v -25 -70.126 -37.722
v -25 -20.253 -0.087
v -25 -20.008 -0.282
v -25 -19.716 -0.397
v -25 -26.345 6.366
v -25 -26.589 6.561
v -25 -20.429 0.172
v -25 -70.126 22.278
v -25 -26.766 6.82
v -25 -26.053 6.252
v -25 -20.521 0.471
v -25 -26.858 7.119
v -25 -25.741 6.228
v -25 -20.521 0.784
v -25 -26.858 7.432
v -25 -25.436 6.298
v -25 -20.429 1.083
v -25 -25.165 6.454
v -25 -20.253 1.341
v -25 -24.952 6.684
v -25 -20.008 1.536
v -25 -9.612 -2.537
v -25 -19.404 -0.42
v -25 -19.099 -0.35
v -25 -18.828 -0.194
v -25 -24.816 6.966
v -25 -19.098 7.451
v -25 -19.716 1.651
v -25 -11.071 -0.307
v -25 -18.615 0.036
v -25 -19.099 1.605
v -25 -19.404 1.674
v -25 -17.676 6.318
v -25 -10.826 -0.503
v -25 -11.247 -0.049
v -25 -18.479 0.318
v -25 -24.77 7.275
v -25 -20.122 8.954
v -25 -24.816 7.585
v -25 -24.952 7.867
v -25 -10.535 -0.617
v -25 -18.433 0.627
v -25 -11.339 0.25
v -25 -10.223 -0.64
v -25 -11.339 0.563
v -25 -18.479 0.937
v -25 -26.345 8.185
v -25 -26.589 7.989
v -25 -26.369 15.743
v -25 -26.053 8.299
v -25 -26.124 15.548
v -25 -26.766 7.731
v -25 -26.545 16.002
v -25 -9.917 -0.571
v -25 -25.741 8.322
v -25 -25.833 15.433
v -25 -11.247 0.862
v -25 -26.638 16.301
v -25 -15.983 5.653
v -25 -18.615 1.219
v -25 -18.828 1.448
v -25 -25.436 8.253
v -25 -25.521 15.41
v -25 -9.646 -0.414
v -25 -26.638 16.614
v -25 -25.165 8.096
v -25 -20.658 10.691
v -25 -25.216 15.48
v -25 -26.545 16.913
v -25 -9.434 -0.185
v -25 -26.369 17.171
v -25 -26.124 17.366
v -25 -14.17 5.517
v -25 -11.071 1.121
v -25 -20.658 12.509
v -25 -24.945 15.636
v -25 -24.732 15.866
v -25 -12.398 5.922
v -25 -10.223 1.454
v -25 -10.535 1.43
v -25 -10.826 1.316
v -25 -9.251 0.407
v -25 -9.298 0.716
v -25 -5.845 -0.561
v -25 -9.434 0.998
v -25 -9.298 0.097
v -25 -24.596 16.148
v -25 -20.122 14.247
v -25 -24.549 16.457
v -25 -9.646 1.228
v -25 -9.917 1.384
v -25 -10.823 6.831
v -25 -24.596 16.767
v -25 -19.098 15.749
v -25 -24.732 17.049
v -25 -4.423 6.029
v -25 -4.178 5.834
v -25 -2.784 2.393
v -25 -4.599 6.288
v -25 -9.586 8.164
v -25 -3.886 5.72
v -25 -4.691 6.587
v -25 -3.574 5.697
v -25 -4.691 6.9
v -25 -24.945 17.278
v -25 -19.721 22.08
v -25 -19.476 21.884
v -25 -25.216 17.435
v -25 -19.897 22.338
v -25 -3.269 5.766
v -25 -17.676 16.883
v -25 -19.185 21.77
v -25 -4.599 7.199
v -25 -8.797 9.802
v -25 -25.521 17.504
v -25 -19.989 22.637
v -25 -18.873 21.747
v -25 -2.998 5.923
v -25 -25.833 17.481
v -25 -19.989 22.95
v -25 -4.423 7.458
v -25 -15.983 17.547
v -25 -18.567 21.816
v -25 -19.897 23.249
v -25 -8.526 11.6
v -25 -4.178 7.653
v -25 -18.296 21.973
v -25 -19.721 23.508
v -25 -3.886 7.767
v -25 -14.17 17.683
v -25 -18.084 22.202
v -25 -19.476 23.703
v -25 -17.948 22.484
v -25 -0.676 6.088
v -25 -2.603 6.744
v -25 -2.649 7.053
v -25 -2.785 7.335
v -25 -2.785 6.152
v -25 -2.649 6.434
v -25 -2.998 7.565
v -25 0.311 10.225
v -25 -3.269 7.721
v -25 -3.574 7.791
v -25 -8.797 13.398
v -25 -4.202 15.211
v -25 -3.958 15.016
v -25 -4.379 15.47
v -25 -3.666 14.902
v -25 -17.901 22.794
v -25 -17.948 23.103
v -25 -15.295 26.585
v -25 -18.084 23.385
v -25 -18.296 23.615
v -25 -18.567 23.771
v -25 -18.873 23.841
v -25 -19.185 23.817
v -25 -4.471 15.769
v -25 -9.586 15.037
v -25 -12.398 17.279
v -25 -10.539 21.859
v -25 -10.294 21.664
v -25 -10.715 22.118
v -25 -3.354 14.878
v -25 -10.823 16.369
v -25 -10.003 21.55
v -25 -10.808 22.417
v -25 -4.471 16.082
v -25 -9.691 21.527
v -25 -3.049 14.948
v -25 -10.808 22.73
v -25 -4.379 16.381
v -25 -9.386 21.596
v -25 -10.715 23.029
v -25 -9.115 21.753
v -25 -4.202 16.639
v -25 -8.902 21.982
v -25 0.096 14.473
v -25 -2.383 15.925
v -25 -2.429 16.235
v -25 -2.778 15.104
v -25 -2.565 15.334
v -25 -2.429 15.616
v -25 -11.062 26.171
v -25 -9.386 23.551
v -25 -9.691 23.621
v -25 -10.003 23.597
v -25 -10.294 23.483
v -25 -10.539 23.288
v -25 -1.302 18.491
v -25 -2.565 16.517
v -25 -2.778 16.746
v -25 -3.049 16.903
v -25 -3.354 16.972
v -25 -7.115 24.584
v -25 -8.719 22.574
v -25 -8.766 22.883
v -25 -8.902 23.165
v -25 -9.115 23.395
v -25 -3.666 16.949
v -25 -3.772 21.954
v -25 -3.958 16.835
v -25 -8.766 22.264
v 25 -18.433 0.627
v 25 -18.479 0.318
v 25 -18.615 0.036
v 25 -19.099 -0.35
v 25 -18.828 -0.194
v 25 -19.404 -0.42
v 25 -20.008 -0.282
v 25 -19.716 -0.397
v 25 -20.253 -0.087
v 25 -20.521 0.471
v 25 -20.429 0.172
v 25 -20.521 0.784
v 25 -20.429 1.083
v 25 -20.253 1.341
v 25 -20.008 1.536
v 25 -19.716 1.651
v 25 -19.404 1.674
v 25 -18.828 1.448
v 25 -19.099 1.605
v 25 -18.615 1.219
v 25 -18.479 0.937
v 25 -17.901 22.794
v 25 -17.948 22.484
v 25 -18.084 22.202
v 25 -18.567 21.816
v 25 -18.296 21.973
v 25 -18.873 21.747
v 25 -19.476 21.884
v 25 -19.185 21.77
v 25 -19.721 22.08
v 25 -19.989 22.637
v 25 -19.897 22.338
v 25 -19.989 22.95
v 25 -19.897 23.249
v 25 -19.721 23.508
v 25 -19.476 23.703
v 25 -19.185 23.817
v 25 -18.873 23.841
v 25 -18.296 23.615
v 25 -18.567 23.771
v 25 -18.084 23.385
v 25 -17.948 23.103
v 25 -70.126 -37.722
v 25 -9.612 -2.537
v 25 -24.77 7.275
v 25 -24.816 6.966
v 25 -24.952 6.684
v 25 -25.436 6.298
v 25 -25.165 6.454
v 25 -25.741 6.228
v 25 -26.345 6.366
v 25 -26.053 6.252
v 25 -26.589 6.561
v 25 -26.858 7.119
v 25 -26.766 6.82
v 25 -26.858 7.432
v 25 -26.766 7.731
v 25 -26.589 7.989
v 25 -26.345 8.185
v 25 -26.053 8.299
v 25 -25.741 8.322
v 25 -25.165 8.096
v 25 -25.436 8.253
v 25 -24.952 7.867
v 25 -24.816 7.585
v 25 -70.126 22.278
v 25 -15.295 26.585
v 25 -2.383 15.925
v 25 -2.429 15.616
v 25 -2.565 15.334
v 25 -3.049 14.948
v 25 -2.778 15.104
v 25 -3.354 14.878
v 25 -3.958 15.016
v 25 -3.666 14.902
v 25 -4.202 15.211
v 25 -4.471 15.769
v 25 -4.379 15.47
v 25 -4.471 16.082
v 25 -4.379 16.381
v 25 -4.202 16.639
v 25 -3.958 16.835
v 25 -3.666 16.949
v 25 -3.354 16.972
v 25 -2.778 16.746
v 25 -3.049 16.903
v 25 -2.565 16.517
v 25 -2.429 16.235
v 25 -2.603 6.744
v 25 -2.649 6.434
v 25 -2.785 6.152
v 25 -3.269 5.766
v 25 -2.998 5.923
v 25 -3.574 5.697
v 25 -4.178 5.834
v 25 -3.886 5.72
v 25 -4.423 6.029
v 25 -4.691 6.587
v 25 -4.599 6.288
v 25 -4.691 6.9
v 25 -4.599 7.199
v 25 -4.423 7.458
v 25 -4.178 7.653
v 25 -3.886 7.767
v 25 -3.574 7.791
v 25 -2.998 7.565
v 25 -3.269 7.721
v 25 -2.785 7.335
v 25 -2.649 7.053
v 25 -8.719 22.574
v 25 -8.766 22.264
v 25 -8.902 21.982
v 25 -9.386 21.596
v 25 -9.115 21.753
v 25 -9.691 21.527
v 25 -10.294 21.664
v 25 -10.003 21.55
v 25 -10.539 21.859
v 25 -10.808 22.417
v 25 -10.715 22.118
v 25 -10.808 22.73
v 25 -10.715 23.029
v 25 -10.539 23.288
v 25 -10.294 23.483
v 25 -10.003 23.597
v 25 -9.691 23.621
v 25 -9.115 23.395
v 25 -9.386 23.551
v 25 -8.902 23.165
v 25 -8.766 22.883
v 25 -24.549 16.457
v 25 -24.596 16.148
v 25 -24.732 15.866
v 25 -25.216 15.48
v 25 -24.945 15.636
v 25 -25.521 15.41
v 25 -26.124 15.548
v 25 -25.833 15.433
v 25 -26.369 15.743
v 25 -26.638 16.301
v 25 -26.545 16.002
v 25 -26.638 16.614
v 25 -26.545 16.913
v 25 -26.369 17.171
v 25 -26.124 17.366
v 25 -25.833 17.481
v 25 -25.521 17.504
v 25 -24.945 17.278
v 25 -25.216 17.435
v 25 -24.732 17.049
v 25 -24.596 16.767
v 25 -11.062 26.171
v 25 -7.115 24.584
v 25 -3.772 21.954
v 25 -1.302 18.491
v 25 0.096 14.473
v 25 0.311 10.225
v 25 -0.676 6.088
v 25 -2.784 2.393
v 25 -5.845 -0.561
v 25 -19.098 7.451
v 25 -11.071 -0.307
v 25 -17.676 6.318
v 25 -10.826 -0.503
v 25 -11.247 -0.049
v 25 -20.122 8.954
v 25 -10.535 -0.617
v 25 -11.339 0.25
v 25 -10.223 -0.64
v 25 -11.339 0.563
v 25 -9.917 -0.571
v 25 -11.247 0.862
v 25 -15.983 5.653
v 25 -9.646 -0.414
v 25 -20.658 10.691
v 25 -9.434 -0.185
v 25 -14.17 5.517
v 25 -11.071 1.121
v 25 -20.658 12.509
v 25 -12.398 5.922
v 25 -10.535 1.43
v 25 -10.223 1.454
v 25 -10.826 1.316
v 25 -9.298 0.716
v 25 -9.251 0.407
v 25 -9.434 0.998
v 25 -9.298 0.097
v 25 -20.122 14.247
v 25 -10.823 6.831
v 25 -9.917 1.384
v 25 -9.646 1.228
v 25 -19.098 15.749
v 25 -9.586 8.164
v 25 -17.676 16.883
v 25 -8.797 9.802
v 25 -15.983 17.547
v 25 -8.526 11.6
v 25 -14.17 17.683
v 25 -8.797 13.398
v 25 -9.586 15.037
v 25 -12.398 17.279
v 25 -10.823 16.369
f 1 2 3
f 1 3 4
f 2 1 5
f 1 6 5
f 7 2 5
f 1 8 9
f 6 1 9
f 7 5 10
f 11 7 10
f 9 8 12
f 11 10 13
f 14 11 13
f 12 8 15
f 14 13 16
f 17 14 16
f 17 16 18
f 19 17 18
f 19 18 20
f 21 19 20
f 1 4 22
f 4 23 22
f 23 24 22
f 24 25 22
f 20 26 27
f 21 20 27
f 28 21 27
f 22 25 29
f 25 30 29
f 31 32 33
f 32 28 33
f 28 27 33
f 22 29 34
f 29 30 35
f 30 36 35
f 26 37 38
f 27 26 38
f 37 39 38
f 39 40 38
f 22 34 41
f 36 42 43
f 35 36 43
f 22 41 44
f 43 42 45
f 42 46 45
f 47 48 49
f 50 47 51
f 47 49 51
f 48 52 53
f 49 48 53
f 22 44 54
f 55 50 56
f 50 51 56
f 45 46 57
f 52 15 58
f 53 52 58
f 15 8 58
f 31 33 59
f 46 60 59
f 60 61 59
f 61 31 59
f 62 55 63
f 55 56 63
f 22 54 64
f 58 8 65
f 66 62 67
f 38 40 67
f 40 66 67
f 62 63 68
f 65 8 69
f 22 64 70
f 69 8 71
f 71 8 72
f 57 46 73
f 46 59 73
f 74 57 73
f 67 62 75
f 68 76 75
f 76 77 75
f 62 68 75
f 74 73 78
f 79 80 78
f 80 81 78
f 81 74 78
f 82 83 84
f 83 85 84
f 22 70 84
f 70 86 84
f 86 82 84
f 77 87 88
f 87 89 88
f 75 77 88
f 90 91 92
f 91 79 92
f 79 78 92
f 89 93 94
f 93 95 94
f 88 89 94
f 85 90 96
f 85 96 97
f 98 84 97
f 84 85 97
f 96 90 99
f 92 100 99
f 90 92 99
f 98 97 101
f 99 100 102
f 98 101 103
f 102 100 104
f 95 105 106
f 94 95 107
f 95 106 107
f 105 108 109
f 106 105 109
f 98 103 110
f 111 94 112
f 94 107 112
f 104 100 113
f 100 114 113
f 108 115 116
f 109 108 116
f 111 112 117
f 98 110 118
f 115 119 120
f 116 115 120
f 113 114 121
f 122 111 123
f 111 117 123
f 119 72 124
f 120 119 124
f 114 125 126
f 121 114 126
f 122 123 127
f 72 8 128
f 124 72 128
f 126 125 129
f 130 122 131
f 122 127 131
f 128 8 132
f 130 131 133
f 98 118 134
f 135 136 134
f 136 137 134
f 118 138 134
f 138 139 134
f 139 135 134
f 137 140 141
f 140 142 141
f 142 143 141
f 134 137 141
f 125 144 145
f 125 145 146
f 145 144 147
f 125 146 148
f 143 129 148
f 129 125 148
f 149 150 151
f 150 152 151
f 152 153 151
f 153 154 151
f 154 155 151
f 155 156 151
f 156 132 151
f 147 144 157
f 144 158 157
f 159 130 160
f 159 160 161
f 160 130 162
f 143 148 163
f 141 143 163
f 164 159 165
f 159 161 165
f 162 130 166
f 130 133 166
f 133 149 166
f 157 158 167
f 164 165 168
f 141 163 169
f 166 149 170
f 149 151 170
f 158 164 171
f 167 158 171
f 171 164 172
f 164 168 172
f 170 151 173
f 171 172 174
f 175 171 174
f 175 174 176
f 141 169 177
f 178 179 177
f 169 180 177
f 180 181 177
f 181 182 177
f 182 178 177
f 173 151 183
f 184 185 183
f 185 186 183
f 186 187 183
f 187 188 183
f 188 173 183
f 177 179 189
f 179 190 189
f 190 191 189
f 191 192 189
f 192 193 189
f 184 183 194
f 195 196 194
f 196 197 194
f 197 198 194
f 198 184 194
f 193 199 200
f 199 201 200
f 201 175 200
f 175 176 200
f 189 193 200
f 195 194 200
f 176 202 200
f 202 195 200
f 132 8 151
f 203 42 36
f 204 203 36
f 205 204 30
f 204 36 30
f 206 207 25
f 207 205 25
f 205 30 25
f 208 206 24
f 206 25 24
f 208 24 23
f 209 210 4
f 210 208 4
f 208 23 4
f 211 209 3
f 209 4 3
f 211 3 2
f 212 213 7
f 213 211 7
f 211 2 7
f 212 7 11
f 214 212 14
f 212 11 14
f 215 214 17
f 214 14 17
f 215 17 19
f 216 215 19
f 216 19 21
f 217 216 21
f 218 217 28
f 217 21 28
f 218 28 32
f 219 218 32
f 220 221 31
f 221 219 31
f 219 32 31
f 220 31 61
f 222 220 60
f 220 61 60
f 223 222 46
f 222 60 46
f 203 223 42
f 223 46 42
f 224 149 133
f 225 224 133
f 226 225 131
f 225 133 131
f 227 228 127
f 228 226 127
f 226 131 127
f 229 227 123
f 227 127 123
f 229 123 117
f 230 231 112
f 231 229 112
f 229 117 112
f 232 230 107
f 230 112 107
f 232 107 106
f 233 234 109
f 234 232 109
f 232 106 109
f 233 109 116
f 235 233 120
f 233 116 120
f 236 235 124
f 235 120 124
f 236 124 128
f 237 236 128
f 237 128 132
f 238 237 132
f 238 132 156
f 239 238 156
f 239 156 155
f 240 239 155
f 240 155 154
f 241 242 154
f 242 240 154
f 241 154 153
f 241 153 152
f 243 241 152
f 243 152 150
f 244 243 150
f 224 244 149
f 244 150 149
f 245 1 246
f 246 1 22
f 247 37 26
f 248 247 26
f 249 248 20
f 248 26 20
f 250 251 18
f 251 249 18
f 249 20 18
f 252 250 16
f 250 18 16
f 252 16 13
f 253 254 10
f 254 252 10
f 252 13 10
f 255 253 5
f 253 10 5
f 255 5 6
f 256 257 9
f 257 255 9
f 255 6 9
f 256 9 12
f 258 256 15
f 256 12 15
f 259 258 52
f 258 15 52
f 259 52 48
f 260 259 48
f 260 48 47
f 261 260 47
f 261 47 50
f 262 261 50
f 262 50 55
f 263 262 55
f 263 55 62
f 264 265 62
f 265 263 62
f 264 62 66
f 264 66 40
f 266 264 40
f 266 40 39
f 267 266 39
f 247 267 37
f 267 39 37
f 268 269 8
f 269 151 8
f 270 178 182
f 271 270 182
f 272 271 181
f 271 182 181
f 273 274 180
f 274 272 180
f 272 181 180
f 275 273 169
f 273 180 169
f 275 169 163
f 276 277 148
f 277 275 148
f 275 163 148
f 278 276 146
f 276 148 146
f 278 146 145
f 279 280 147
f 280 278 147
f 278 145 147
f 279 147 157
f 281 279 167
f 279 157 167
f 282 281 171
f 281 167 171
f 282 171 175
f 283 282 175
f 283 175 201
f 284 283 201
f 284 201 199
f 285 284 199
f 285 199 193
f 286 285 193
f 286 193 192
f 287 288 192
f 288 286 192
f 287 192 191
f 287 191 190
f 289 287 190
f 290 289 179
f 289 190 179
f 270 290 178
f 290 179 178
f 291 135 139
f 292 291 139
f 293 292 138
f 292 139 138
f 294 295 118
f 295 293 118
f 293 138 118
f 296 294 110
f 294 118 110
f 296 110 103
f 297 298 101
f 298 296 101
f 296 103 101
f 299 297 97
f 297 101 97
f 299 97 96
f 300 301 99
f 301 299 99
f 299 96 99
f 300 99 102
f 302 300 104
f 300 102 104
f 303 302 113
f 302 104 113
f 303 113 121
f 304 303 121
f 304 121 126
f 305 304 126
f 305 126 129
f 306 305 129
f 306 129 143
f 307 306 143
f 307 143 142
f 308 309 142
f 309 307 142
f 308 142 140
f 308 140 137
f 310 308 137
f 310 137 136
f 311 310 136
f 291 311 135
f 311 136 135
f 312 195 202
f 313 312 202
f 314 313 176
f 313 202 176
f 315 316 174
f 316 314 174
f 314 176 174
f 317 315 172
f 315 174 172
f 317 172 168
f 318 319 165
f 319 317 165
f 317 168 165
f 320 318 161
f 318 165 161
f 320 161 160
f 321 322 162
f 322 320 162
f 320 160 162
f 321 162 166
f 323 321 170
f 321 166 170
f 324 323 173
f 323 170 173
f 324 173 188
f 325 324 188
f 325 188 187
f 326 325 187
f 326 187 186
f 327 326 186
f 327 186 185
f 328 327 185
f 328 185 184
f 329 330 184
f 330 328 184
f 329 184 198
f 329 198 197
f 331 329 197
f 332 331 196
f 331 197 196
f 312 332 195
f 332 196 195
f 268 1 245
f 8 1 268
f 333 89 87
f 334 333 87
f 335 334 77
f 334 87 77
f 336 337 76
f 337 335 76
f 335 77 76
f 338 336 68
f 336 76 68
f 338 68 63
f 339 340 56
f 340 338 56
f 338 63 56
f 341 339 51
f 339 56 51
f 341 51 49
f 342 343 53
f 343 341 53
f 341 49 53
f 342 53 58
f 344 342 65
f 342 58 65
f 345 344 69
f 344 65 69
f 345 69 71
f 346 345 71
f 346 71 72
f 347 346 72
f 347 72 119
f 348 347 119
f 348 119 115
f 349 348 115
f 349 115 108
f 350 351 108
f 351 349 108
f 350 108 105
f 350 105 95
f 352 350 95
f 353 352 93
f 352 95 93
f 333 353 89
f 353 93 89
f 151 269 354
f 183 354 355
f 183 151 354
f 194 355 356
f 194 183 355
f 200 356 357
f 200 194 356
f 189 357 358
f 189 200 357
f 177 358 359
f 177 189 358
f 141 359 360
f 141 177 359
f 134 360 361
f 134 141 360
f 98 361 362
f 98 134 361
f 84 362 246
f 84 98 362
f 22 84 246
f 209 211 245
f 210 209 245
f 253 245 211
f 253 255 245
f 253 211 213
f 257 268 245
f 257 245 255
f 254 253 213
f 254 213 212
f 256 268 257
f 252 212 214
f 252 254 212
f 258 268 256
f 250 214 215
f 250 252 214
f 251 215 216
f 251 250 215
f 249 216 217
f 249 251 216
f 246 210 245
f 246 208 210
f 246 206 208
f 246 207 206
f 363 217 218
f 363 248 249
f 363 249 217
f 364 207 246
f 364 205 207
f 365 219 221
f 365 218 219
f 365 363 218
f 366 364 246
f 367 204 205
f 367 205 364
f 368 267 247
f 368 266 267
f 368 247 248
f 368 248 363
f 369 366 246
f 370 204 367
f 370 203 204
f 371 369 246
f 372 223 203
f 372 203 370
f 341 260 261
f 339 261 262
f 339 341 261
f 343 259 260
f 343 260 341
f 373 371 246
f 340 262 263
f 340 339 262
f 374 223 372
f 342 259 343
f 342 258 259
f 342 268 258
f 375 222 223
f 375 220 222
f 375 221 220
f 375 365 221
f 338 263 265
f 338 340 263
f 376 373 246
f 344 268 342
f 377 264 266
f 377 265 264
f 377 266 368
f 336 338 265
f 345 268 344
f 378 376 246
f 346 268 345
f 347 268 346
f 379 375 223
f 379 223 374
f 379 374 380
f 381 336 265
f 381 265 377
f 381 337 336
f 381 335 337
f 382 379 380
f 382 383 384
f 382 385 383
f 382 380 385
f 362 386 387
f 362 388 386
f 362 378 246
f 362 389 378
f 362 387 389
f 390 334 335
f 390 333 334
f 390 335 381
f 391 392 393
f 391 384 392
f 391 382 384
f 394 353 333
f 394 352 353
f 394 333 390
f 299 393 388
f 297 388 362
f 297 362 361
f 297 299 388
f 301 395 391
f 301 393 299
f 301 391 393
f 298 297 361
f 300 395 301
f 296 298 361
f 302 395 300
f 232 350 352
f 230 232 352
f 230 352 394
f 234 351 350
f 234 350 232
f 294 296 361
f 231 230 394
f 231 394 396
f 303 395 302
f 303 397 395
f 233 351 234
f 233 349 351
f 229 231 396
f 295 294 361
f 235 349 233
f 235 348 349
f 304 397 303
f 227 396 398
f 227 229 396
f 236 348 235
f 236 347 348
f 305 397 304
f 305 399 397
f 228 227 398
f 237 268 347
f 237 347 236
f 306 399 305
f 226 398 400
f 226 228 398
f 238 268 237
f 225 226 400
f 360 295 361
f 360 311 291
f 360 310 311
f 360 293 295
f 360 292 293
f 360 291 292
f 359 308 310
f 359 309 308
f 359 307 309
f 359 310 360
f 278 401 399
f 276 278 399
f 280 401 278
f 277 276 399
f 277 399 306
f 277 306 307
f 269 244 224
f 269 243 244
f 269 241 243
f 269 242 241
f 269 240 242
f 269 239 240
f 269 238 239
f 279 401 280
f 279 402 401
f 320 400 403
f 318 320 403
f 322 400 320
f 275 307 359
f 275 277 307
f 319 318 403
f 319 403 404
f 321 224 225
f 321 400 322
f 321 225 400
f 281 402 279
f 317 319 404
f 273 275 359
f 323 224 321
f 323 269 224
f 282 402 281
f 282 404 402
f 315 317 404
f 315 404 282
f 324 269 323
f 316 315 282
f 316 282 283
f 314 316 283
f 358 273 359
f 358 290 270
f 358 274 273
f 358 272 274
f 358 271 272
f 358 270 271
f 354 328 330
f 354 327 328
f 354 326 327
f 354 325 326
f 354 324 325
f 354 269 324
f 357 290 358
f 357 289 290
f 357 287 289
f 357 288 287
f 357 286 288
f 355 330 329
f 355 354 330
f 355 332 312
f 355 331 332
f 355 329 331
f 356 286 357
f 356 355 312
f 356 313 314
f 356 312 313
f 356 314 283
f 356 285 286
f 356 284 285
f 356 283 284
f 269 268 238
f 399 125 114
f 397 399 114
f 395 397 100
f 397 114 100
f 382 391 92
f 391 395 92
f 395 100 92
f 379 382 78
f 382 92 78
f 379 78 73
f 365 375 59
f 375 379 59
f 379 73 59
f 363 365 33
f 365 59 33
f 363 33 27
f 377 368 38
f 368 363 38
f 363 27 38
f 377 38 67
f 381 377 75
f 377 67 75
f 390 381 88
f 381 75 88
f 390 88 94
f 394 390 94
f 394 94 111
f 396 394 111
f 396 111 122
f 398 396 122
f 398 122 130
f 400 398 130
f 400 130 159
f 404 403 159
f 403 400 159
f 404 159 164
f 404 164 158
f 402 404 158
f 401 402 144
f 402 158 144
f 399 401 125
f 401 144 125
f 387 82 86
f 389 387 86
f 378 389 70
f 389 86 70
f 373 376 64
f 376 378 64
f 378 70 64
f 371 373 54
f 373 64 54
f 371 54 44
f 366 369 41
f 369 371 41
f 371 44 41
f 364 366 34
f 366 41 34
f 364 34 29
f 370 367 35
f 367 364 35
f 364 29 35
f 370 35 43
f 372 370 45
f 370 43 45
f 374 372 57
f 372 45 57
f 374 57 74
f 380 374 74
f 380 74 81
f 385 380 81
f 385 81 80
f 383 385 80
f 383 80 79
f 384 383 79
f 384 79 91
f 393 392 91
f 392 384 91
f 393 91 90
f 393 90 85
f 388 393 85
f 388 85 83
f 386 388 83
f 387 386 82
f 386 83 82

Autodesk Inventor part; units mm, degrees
sketch "Эскиз1" plane through (0, 0, 0) normal (1, 0, 0) x (0, 1, 0)
  line L0 (-84.2261, 0) -> (14.4739, 0) construction
  circle A0 centre (-14.6261, 11.6003) radius 15 projected
  line L1 (-70.1261, -37.7219) -> (-70.1261, 22.2781)
  line L2 (-70.1261, -37.7219) -> (-9.6116, -2.5367)
  line L3 (-15.295, 26.5854) -> (-70.1261, 22.2781)
  line L4 (-70.1261, 36.1012) -> (-70.1261, -83.8988) projected
  line L5 (-70.1261, -37.7219) -> (-60.535, -54.2175)
  line L6 (-15.295, 26.5854) -> (-16.485, 41.7343)
  circle A1 centre (-10.3011, 0.4068) radius 1.05 projected
  circle A2 centre (-19.4828, 0.6271) radius 1.05 projected
  circle A3 centre (-25.8196, 7.2753) radius 1.05 projected
  circle A4 centre (-25.5993, 16.4571) radius 1.05 projected
  circle A5 centre (-18.9511, 22.7938) radius 1.05 projected
  circle A6 centre (-9.7693, 22.5736) radius 1.05 projected
  circle A7 centre (-3.4326, 15.9253) radius 1.05 projected
  circle A8 centre (-3.6528, 6.7436) radius 1.05 projected
  circle A9 centre (-14.6261, 11.6003) radius 6.1
  dimension "d21" = 60
  dimension "d24" = 70
  dimension "d25" = 55
  dimension "d26" = 59.825
  dimension "d29" = 12.2
extrude "Выдавливание3" add sketch "Эскиз1" along normal mid plane 50 contours A0 L3 | L2 L1 L3 A0 picked at (-14.2037, 20.8402)
sketch "Эскиз3" plane through (-25, -70.1261, -37.7219) normal (0, -1, 0) x (1, 0, 0)
  point P0 (25, 37.7219)
properties part number "Ушко петли крышки"
